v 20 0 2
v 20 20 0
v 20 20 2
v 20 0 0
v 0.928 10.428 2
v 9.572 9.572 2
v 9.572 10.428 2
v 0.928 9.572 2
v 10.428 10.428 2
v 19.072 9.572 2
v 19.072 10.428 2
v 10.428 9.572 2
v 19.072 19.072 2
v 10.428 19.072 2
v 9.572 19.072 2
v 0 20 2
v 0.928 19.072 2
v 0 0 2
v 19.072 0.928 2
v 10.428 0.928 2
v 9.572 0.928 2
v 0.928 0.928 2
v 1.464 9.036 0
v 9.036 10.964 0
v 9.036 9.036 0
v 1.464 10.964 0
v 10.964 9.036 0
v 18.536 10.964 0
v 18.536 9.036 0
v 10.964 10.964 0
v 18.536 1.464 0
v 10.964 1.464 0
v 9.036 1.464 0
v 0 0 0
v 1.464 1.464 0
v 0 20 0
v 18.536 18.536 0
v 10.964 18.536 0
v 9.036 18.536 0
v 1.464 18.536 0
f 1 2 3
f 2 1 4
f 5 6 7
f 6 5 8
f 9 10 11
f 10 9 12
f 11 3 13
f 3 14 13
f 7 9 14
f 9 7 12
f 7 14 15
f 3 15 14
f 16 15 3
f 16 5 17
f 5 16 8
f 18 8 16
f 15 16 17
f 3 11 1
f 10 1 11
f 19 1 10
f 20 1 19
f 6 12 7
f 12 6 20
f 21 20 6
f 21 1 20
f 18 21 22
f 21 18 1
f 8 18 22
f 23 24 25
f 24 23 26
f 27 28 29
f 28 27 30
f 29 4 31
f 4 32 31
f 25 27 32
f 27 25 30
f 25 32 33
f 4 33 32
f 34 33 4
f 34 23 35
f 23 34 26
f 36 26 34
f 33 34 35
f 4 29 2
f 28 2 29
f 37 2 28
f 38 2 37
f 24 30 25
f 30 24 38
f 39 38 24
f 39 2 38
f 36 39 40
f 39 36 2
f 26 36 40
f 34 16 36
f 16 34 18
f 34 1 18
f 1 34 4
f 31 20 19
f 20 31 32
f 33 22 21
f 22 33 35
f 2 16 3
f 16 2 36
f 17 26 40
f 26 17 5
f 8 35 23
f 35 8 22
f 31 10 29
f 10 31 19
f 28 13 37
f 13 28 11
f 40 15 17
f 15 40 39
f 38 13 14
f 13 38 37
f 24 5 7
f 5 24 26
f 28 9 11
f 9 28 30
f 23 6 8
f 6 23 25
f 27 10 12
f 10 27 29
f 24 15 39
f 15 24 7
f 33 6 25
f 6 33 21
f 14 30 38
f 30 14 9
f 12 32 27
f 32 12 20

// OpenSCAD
module framepart(l,h) {
	difference(){
		cube([l,h,h]);
		translate([-h,h,-h])
			rotate([15,0,0])
				cube([l+2*h,2*h,3*h]);
	}
}

module bar(l,h) {
	difference(){
		cube([l,h,h]);
		translate([-h/2,h+h/4,-h])
			rotate([15,0,0])
				cube([l+2,2*h,3*h]);
		translate([l+h/2,-h/4,-h])
			rotate([15,0,180])
				cube([l+2,2*h,3*h]);		
	}
}

module frame(l,h){
	union() {
	framepart(l,h);
	translate([0,l,0])
		rotate([0,0,-90])
			framepart(l,h);
	translate([l,0,0])
		rotate([0,0,90])
			framepart(l,h);
	translate([l,l,0])
		rotate([0,0,180])
			framepart(l,h);
	translate([0,l/2-h/2,0])	
		bar(l,h);
	translate([l/2+h/2,0,0])
		rotate([0,0,90])	
			bar(l,h);		
	}
}

frame(20,2);
